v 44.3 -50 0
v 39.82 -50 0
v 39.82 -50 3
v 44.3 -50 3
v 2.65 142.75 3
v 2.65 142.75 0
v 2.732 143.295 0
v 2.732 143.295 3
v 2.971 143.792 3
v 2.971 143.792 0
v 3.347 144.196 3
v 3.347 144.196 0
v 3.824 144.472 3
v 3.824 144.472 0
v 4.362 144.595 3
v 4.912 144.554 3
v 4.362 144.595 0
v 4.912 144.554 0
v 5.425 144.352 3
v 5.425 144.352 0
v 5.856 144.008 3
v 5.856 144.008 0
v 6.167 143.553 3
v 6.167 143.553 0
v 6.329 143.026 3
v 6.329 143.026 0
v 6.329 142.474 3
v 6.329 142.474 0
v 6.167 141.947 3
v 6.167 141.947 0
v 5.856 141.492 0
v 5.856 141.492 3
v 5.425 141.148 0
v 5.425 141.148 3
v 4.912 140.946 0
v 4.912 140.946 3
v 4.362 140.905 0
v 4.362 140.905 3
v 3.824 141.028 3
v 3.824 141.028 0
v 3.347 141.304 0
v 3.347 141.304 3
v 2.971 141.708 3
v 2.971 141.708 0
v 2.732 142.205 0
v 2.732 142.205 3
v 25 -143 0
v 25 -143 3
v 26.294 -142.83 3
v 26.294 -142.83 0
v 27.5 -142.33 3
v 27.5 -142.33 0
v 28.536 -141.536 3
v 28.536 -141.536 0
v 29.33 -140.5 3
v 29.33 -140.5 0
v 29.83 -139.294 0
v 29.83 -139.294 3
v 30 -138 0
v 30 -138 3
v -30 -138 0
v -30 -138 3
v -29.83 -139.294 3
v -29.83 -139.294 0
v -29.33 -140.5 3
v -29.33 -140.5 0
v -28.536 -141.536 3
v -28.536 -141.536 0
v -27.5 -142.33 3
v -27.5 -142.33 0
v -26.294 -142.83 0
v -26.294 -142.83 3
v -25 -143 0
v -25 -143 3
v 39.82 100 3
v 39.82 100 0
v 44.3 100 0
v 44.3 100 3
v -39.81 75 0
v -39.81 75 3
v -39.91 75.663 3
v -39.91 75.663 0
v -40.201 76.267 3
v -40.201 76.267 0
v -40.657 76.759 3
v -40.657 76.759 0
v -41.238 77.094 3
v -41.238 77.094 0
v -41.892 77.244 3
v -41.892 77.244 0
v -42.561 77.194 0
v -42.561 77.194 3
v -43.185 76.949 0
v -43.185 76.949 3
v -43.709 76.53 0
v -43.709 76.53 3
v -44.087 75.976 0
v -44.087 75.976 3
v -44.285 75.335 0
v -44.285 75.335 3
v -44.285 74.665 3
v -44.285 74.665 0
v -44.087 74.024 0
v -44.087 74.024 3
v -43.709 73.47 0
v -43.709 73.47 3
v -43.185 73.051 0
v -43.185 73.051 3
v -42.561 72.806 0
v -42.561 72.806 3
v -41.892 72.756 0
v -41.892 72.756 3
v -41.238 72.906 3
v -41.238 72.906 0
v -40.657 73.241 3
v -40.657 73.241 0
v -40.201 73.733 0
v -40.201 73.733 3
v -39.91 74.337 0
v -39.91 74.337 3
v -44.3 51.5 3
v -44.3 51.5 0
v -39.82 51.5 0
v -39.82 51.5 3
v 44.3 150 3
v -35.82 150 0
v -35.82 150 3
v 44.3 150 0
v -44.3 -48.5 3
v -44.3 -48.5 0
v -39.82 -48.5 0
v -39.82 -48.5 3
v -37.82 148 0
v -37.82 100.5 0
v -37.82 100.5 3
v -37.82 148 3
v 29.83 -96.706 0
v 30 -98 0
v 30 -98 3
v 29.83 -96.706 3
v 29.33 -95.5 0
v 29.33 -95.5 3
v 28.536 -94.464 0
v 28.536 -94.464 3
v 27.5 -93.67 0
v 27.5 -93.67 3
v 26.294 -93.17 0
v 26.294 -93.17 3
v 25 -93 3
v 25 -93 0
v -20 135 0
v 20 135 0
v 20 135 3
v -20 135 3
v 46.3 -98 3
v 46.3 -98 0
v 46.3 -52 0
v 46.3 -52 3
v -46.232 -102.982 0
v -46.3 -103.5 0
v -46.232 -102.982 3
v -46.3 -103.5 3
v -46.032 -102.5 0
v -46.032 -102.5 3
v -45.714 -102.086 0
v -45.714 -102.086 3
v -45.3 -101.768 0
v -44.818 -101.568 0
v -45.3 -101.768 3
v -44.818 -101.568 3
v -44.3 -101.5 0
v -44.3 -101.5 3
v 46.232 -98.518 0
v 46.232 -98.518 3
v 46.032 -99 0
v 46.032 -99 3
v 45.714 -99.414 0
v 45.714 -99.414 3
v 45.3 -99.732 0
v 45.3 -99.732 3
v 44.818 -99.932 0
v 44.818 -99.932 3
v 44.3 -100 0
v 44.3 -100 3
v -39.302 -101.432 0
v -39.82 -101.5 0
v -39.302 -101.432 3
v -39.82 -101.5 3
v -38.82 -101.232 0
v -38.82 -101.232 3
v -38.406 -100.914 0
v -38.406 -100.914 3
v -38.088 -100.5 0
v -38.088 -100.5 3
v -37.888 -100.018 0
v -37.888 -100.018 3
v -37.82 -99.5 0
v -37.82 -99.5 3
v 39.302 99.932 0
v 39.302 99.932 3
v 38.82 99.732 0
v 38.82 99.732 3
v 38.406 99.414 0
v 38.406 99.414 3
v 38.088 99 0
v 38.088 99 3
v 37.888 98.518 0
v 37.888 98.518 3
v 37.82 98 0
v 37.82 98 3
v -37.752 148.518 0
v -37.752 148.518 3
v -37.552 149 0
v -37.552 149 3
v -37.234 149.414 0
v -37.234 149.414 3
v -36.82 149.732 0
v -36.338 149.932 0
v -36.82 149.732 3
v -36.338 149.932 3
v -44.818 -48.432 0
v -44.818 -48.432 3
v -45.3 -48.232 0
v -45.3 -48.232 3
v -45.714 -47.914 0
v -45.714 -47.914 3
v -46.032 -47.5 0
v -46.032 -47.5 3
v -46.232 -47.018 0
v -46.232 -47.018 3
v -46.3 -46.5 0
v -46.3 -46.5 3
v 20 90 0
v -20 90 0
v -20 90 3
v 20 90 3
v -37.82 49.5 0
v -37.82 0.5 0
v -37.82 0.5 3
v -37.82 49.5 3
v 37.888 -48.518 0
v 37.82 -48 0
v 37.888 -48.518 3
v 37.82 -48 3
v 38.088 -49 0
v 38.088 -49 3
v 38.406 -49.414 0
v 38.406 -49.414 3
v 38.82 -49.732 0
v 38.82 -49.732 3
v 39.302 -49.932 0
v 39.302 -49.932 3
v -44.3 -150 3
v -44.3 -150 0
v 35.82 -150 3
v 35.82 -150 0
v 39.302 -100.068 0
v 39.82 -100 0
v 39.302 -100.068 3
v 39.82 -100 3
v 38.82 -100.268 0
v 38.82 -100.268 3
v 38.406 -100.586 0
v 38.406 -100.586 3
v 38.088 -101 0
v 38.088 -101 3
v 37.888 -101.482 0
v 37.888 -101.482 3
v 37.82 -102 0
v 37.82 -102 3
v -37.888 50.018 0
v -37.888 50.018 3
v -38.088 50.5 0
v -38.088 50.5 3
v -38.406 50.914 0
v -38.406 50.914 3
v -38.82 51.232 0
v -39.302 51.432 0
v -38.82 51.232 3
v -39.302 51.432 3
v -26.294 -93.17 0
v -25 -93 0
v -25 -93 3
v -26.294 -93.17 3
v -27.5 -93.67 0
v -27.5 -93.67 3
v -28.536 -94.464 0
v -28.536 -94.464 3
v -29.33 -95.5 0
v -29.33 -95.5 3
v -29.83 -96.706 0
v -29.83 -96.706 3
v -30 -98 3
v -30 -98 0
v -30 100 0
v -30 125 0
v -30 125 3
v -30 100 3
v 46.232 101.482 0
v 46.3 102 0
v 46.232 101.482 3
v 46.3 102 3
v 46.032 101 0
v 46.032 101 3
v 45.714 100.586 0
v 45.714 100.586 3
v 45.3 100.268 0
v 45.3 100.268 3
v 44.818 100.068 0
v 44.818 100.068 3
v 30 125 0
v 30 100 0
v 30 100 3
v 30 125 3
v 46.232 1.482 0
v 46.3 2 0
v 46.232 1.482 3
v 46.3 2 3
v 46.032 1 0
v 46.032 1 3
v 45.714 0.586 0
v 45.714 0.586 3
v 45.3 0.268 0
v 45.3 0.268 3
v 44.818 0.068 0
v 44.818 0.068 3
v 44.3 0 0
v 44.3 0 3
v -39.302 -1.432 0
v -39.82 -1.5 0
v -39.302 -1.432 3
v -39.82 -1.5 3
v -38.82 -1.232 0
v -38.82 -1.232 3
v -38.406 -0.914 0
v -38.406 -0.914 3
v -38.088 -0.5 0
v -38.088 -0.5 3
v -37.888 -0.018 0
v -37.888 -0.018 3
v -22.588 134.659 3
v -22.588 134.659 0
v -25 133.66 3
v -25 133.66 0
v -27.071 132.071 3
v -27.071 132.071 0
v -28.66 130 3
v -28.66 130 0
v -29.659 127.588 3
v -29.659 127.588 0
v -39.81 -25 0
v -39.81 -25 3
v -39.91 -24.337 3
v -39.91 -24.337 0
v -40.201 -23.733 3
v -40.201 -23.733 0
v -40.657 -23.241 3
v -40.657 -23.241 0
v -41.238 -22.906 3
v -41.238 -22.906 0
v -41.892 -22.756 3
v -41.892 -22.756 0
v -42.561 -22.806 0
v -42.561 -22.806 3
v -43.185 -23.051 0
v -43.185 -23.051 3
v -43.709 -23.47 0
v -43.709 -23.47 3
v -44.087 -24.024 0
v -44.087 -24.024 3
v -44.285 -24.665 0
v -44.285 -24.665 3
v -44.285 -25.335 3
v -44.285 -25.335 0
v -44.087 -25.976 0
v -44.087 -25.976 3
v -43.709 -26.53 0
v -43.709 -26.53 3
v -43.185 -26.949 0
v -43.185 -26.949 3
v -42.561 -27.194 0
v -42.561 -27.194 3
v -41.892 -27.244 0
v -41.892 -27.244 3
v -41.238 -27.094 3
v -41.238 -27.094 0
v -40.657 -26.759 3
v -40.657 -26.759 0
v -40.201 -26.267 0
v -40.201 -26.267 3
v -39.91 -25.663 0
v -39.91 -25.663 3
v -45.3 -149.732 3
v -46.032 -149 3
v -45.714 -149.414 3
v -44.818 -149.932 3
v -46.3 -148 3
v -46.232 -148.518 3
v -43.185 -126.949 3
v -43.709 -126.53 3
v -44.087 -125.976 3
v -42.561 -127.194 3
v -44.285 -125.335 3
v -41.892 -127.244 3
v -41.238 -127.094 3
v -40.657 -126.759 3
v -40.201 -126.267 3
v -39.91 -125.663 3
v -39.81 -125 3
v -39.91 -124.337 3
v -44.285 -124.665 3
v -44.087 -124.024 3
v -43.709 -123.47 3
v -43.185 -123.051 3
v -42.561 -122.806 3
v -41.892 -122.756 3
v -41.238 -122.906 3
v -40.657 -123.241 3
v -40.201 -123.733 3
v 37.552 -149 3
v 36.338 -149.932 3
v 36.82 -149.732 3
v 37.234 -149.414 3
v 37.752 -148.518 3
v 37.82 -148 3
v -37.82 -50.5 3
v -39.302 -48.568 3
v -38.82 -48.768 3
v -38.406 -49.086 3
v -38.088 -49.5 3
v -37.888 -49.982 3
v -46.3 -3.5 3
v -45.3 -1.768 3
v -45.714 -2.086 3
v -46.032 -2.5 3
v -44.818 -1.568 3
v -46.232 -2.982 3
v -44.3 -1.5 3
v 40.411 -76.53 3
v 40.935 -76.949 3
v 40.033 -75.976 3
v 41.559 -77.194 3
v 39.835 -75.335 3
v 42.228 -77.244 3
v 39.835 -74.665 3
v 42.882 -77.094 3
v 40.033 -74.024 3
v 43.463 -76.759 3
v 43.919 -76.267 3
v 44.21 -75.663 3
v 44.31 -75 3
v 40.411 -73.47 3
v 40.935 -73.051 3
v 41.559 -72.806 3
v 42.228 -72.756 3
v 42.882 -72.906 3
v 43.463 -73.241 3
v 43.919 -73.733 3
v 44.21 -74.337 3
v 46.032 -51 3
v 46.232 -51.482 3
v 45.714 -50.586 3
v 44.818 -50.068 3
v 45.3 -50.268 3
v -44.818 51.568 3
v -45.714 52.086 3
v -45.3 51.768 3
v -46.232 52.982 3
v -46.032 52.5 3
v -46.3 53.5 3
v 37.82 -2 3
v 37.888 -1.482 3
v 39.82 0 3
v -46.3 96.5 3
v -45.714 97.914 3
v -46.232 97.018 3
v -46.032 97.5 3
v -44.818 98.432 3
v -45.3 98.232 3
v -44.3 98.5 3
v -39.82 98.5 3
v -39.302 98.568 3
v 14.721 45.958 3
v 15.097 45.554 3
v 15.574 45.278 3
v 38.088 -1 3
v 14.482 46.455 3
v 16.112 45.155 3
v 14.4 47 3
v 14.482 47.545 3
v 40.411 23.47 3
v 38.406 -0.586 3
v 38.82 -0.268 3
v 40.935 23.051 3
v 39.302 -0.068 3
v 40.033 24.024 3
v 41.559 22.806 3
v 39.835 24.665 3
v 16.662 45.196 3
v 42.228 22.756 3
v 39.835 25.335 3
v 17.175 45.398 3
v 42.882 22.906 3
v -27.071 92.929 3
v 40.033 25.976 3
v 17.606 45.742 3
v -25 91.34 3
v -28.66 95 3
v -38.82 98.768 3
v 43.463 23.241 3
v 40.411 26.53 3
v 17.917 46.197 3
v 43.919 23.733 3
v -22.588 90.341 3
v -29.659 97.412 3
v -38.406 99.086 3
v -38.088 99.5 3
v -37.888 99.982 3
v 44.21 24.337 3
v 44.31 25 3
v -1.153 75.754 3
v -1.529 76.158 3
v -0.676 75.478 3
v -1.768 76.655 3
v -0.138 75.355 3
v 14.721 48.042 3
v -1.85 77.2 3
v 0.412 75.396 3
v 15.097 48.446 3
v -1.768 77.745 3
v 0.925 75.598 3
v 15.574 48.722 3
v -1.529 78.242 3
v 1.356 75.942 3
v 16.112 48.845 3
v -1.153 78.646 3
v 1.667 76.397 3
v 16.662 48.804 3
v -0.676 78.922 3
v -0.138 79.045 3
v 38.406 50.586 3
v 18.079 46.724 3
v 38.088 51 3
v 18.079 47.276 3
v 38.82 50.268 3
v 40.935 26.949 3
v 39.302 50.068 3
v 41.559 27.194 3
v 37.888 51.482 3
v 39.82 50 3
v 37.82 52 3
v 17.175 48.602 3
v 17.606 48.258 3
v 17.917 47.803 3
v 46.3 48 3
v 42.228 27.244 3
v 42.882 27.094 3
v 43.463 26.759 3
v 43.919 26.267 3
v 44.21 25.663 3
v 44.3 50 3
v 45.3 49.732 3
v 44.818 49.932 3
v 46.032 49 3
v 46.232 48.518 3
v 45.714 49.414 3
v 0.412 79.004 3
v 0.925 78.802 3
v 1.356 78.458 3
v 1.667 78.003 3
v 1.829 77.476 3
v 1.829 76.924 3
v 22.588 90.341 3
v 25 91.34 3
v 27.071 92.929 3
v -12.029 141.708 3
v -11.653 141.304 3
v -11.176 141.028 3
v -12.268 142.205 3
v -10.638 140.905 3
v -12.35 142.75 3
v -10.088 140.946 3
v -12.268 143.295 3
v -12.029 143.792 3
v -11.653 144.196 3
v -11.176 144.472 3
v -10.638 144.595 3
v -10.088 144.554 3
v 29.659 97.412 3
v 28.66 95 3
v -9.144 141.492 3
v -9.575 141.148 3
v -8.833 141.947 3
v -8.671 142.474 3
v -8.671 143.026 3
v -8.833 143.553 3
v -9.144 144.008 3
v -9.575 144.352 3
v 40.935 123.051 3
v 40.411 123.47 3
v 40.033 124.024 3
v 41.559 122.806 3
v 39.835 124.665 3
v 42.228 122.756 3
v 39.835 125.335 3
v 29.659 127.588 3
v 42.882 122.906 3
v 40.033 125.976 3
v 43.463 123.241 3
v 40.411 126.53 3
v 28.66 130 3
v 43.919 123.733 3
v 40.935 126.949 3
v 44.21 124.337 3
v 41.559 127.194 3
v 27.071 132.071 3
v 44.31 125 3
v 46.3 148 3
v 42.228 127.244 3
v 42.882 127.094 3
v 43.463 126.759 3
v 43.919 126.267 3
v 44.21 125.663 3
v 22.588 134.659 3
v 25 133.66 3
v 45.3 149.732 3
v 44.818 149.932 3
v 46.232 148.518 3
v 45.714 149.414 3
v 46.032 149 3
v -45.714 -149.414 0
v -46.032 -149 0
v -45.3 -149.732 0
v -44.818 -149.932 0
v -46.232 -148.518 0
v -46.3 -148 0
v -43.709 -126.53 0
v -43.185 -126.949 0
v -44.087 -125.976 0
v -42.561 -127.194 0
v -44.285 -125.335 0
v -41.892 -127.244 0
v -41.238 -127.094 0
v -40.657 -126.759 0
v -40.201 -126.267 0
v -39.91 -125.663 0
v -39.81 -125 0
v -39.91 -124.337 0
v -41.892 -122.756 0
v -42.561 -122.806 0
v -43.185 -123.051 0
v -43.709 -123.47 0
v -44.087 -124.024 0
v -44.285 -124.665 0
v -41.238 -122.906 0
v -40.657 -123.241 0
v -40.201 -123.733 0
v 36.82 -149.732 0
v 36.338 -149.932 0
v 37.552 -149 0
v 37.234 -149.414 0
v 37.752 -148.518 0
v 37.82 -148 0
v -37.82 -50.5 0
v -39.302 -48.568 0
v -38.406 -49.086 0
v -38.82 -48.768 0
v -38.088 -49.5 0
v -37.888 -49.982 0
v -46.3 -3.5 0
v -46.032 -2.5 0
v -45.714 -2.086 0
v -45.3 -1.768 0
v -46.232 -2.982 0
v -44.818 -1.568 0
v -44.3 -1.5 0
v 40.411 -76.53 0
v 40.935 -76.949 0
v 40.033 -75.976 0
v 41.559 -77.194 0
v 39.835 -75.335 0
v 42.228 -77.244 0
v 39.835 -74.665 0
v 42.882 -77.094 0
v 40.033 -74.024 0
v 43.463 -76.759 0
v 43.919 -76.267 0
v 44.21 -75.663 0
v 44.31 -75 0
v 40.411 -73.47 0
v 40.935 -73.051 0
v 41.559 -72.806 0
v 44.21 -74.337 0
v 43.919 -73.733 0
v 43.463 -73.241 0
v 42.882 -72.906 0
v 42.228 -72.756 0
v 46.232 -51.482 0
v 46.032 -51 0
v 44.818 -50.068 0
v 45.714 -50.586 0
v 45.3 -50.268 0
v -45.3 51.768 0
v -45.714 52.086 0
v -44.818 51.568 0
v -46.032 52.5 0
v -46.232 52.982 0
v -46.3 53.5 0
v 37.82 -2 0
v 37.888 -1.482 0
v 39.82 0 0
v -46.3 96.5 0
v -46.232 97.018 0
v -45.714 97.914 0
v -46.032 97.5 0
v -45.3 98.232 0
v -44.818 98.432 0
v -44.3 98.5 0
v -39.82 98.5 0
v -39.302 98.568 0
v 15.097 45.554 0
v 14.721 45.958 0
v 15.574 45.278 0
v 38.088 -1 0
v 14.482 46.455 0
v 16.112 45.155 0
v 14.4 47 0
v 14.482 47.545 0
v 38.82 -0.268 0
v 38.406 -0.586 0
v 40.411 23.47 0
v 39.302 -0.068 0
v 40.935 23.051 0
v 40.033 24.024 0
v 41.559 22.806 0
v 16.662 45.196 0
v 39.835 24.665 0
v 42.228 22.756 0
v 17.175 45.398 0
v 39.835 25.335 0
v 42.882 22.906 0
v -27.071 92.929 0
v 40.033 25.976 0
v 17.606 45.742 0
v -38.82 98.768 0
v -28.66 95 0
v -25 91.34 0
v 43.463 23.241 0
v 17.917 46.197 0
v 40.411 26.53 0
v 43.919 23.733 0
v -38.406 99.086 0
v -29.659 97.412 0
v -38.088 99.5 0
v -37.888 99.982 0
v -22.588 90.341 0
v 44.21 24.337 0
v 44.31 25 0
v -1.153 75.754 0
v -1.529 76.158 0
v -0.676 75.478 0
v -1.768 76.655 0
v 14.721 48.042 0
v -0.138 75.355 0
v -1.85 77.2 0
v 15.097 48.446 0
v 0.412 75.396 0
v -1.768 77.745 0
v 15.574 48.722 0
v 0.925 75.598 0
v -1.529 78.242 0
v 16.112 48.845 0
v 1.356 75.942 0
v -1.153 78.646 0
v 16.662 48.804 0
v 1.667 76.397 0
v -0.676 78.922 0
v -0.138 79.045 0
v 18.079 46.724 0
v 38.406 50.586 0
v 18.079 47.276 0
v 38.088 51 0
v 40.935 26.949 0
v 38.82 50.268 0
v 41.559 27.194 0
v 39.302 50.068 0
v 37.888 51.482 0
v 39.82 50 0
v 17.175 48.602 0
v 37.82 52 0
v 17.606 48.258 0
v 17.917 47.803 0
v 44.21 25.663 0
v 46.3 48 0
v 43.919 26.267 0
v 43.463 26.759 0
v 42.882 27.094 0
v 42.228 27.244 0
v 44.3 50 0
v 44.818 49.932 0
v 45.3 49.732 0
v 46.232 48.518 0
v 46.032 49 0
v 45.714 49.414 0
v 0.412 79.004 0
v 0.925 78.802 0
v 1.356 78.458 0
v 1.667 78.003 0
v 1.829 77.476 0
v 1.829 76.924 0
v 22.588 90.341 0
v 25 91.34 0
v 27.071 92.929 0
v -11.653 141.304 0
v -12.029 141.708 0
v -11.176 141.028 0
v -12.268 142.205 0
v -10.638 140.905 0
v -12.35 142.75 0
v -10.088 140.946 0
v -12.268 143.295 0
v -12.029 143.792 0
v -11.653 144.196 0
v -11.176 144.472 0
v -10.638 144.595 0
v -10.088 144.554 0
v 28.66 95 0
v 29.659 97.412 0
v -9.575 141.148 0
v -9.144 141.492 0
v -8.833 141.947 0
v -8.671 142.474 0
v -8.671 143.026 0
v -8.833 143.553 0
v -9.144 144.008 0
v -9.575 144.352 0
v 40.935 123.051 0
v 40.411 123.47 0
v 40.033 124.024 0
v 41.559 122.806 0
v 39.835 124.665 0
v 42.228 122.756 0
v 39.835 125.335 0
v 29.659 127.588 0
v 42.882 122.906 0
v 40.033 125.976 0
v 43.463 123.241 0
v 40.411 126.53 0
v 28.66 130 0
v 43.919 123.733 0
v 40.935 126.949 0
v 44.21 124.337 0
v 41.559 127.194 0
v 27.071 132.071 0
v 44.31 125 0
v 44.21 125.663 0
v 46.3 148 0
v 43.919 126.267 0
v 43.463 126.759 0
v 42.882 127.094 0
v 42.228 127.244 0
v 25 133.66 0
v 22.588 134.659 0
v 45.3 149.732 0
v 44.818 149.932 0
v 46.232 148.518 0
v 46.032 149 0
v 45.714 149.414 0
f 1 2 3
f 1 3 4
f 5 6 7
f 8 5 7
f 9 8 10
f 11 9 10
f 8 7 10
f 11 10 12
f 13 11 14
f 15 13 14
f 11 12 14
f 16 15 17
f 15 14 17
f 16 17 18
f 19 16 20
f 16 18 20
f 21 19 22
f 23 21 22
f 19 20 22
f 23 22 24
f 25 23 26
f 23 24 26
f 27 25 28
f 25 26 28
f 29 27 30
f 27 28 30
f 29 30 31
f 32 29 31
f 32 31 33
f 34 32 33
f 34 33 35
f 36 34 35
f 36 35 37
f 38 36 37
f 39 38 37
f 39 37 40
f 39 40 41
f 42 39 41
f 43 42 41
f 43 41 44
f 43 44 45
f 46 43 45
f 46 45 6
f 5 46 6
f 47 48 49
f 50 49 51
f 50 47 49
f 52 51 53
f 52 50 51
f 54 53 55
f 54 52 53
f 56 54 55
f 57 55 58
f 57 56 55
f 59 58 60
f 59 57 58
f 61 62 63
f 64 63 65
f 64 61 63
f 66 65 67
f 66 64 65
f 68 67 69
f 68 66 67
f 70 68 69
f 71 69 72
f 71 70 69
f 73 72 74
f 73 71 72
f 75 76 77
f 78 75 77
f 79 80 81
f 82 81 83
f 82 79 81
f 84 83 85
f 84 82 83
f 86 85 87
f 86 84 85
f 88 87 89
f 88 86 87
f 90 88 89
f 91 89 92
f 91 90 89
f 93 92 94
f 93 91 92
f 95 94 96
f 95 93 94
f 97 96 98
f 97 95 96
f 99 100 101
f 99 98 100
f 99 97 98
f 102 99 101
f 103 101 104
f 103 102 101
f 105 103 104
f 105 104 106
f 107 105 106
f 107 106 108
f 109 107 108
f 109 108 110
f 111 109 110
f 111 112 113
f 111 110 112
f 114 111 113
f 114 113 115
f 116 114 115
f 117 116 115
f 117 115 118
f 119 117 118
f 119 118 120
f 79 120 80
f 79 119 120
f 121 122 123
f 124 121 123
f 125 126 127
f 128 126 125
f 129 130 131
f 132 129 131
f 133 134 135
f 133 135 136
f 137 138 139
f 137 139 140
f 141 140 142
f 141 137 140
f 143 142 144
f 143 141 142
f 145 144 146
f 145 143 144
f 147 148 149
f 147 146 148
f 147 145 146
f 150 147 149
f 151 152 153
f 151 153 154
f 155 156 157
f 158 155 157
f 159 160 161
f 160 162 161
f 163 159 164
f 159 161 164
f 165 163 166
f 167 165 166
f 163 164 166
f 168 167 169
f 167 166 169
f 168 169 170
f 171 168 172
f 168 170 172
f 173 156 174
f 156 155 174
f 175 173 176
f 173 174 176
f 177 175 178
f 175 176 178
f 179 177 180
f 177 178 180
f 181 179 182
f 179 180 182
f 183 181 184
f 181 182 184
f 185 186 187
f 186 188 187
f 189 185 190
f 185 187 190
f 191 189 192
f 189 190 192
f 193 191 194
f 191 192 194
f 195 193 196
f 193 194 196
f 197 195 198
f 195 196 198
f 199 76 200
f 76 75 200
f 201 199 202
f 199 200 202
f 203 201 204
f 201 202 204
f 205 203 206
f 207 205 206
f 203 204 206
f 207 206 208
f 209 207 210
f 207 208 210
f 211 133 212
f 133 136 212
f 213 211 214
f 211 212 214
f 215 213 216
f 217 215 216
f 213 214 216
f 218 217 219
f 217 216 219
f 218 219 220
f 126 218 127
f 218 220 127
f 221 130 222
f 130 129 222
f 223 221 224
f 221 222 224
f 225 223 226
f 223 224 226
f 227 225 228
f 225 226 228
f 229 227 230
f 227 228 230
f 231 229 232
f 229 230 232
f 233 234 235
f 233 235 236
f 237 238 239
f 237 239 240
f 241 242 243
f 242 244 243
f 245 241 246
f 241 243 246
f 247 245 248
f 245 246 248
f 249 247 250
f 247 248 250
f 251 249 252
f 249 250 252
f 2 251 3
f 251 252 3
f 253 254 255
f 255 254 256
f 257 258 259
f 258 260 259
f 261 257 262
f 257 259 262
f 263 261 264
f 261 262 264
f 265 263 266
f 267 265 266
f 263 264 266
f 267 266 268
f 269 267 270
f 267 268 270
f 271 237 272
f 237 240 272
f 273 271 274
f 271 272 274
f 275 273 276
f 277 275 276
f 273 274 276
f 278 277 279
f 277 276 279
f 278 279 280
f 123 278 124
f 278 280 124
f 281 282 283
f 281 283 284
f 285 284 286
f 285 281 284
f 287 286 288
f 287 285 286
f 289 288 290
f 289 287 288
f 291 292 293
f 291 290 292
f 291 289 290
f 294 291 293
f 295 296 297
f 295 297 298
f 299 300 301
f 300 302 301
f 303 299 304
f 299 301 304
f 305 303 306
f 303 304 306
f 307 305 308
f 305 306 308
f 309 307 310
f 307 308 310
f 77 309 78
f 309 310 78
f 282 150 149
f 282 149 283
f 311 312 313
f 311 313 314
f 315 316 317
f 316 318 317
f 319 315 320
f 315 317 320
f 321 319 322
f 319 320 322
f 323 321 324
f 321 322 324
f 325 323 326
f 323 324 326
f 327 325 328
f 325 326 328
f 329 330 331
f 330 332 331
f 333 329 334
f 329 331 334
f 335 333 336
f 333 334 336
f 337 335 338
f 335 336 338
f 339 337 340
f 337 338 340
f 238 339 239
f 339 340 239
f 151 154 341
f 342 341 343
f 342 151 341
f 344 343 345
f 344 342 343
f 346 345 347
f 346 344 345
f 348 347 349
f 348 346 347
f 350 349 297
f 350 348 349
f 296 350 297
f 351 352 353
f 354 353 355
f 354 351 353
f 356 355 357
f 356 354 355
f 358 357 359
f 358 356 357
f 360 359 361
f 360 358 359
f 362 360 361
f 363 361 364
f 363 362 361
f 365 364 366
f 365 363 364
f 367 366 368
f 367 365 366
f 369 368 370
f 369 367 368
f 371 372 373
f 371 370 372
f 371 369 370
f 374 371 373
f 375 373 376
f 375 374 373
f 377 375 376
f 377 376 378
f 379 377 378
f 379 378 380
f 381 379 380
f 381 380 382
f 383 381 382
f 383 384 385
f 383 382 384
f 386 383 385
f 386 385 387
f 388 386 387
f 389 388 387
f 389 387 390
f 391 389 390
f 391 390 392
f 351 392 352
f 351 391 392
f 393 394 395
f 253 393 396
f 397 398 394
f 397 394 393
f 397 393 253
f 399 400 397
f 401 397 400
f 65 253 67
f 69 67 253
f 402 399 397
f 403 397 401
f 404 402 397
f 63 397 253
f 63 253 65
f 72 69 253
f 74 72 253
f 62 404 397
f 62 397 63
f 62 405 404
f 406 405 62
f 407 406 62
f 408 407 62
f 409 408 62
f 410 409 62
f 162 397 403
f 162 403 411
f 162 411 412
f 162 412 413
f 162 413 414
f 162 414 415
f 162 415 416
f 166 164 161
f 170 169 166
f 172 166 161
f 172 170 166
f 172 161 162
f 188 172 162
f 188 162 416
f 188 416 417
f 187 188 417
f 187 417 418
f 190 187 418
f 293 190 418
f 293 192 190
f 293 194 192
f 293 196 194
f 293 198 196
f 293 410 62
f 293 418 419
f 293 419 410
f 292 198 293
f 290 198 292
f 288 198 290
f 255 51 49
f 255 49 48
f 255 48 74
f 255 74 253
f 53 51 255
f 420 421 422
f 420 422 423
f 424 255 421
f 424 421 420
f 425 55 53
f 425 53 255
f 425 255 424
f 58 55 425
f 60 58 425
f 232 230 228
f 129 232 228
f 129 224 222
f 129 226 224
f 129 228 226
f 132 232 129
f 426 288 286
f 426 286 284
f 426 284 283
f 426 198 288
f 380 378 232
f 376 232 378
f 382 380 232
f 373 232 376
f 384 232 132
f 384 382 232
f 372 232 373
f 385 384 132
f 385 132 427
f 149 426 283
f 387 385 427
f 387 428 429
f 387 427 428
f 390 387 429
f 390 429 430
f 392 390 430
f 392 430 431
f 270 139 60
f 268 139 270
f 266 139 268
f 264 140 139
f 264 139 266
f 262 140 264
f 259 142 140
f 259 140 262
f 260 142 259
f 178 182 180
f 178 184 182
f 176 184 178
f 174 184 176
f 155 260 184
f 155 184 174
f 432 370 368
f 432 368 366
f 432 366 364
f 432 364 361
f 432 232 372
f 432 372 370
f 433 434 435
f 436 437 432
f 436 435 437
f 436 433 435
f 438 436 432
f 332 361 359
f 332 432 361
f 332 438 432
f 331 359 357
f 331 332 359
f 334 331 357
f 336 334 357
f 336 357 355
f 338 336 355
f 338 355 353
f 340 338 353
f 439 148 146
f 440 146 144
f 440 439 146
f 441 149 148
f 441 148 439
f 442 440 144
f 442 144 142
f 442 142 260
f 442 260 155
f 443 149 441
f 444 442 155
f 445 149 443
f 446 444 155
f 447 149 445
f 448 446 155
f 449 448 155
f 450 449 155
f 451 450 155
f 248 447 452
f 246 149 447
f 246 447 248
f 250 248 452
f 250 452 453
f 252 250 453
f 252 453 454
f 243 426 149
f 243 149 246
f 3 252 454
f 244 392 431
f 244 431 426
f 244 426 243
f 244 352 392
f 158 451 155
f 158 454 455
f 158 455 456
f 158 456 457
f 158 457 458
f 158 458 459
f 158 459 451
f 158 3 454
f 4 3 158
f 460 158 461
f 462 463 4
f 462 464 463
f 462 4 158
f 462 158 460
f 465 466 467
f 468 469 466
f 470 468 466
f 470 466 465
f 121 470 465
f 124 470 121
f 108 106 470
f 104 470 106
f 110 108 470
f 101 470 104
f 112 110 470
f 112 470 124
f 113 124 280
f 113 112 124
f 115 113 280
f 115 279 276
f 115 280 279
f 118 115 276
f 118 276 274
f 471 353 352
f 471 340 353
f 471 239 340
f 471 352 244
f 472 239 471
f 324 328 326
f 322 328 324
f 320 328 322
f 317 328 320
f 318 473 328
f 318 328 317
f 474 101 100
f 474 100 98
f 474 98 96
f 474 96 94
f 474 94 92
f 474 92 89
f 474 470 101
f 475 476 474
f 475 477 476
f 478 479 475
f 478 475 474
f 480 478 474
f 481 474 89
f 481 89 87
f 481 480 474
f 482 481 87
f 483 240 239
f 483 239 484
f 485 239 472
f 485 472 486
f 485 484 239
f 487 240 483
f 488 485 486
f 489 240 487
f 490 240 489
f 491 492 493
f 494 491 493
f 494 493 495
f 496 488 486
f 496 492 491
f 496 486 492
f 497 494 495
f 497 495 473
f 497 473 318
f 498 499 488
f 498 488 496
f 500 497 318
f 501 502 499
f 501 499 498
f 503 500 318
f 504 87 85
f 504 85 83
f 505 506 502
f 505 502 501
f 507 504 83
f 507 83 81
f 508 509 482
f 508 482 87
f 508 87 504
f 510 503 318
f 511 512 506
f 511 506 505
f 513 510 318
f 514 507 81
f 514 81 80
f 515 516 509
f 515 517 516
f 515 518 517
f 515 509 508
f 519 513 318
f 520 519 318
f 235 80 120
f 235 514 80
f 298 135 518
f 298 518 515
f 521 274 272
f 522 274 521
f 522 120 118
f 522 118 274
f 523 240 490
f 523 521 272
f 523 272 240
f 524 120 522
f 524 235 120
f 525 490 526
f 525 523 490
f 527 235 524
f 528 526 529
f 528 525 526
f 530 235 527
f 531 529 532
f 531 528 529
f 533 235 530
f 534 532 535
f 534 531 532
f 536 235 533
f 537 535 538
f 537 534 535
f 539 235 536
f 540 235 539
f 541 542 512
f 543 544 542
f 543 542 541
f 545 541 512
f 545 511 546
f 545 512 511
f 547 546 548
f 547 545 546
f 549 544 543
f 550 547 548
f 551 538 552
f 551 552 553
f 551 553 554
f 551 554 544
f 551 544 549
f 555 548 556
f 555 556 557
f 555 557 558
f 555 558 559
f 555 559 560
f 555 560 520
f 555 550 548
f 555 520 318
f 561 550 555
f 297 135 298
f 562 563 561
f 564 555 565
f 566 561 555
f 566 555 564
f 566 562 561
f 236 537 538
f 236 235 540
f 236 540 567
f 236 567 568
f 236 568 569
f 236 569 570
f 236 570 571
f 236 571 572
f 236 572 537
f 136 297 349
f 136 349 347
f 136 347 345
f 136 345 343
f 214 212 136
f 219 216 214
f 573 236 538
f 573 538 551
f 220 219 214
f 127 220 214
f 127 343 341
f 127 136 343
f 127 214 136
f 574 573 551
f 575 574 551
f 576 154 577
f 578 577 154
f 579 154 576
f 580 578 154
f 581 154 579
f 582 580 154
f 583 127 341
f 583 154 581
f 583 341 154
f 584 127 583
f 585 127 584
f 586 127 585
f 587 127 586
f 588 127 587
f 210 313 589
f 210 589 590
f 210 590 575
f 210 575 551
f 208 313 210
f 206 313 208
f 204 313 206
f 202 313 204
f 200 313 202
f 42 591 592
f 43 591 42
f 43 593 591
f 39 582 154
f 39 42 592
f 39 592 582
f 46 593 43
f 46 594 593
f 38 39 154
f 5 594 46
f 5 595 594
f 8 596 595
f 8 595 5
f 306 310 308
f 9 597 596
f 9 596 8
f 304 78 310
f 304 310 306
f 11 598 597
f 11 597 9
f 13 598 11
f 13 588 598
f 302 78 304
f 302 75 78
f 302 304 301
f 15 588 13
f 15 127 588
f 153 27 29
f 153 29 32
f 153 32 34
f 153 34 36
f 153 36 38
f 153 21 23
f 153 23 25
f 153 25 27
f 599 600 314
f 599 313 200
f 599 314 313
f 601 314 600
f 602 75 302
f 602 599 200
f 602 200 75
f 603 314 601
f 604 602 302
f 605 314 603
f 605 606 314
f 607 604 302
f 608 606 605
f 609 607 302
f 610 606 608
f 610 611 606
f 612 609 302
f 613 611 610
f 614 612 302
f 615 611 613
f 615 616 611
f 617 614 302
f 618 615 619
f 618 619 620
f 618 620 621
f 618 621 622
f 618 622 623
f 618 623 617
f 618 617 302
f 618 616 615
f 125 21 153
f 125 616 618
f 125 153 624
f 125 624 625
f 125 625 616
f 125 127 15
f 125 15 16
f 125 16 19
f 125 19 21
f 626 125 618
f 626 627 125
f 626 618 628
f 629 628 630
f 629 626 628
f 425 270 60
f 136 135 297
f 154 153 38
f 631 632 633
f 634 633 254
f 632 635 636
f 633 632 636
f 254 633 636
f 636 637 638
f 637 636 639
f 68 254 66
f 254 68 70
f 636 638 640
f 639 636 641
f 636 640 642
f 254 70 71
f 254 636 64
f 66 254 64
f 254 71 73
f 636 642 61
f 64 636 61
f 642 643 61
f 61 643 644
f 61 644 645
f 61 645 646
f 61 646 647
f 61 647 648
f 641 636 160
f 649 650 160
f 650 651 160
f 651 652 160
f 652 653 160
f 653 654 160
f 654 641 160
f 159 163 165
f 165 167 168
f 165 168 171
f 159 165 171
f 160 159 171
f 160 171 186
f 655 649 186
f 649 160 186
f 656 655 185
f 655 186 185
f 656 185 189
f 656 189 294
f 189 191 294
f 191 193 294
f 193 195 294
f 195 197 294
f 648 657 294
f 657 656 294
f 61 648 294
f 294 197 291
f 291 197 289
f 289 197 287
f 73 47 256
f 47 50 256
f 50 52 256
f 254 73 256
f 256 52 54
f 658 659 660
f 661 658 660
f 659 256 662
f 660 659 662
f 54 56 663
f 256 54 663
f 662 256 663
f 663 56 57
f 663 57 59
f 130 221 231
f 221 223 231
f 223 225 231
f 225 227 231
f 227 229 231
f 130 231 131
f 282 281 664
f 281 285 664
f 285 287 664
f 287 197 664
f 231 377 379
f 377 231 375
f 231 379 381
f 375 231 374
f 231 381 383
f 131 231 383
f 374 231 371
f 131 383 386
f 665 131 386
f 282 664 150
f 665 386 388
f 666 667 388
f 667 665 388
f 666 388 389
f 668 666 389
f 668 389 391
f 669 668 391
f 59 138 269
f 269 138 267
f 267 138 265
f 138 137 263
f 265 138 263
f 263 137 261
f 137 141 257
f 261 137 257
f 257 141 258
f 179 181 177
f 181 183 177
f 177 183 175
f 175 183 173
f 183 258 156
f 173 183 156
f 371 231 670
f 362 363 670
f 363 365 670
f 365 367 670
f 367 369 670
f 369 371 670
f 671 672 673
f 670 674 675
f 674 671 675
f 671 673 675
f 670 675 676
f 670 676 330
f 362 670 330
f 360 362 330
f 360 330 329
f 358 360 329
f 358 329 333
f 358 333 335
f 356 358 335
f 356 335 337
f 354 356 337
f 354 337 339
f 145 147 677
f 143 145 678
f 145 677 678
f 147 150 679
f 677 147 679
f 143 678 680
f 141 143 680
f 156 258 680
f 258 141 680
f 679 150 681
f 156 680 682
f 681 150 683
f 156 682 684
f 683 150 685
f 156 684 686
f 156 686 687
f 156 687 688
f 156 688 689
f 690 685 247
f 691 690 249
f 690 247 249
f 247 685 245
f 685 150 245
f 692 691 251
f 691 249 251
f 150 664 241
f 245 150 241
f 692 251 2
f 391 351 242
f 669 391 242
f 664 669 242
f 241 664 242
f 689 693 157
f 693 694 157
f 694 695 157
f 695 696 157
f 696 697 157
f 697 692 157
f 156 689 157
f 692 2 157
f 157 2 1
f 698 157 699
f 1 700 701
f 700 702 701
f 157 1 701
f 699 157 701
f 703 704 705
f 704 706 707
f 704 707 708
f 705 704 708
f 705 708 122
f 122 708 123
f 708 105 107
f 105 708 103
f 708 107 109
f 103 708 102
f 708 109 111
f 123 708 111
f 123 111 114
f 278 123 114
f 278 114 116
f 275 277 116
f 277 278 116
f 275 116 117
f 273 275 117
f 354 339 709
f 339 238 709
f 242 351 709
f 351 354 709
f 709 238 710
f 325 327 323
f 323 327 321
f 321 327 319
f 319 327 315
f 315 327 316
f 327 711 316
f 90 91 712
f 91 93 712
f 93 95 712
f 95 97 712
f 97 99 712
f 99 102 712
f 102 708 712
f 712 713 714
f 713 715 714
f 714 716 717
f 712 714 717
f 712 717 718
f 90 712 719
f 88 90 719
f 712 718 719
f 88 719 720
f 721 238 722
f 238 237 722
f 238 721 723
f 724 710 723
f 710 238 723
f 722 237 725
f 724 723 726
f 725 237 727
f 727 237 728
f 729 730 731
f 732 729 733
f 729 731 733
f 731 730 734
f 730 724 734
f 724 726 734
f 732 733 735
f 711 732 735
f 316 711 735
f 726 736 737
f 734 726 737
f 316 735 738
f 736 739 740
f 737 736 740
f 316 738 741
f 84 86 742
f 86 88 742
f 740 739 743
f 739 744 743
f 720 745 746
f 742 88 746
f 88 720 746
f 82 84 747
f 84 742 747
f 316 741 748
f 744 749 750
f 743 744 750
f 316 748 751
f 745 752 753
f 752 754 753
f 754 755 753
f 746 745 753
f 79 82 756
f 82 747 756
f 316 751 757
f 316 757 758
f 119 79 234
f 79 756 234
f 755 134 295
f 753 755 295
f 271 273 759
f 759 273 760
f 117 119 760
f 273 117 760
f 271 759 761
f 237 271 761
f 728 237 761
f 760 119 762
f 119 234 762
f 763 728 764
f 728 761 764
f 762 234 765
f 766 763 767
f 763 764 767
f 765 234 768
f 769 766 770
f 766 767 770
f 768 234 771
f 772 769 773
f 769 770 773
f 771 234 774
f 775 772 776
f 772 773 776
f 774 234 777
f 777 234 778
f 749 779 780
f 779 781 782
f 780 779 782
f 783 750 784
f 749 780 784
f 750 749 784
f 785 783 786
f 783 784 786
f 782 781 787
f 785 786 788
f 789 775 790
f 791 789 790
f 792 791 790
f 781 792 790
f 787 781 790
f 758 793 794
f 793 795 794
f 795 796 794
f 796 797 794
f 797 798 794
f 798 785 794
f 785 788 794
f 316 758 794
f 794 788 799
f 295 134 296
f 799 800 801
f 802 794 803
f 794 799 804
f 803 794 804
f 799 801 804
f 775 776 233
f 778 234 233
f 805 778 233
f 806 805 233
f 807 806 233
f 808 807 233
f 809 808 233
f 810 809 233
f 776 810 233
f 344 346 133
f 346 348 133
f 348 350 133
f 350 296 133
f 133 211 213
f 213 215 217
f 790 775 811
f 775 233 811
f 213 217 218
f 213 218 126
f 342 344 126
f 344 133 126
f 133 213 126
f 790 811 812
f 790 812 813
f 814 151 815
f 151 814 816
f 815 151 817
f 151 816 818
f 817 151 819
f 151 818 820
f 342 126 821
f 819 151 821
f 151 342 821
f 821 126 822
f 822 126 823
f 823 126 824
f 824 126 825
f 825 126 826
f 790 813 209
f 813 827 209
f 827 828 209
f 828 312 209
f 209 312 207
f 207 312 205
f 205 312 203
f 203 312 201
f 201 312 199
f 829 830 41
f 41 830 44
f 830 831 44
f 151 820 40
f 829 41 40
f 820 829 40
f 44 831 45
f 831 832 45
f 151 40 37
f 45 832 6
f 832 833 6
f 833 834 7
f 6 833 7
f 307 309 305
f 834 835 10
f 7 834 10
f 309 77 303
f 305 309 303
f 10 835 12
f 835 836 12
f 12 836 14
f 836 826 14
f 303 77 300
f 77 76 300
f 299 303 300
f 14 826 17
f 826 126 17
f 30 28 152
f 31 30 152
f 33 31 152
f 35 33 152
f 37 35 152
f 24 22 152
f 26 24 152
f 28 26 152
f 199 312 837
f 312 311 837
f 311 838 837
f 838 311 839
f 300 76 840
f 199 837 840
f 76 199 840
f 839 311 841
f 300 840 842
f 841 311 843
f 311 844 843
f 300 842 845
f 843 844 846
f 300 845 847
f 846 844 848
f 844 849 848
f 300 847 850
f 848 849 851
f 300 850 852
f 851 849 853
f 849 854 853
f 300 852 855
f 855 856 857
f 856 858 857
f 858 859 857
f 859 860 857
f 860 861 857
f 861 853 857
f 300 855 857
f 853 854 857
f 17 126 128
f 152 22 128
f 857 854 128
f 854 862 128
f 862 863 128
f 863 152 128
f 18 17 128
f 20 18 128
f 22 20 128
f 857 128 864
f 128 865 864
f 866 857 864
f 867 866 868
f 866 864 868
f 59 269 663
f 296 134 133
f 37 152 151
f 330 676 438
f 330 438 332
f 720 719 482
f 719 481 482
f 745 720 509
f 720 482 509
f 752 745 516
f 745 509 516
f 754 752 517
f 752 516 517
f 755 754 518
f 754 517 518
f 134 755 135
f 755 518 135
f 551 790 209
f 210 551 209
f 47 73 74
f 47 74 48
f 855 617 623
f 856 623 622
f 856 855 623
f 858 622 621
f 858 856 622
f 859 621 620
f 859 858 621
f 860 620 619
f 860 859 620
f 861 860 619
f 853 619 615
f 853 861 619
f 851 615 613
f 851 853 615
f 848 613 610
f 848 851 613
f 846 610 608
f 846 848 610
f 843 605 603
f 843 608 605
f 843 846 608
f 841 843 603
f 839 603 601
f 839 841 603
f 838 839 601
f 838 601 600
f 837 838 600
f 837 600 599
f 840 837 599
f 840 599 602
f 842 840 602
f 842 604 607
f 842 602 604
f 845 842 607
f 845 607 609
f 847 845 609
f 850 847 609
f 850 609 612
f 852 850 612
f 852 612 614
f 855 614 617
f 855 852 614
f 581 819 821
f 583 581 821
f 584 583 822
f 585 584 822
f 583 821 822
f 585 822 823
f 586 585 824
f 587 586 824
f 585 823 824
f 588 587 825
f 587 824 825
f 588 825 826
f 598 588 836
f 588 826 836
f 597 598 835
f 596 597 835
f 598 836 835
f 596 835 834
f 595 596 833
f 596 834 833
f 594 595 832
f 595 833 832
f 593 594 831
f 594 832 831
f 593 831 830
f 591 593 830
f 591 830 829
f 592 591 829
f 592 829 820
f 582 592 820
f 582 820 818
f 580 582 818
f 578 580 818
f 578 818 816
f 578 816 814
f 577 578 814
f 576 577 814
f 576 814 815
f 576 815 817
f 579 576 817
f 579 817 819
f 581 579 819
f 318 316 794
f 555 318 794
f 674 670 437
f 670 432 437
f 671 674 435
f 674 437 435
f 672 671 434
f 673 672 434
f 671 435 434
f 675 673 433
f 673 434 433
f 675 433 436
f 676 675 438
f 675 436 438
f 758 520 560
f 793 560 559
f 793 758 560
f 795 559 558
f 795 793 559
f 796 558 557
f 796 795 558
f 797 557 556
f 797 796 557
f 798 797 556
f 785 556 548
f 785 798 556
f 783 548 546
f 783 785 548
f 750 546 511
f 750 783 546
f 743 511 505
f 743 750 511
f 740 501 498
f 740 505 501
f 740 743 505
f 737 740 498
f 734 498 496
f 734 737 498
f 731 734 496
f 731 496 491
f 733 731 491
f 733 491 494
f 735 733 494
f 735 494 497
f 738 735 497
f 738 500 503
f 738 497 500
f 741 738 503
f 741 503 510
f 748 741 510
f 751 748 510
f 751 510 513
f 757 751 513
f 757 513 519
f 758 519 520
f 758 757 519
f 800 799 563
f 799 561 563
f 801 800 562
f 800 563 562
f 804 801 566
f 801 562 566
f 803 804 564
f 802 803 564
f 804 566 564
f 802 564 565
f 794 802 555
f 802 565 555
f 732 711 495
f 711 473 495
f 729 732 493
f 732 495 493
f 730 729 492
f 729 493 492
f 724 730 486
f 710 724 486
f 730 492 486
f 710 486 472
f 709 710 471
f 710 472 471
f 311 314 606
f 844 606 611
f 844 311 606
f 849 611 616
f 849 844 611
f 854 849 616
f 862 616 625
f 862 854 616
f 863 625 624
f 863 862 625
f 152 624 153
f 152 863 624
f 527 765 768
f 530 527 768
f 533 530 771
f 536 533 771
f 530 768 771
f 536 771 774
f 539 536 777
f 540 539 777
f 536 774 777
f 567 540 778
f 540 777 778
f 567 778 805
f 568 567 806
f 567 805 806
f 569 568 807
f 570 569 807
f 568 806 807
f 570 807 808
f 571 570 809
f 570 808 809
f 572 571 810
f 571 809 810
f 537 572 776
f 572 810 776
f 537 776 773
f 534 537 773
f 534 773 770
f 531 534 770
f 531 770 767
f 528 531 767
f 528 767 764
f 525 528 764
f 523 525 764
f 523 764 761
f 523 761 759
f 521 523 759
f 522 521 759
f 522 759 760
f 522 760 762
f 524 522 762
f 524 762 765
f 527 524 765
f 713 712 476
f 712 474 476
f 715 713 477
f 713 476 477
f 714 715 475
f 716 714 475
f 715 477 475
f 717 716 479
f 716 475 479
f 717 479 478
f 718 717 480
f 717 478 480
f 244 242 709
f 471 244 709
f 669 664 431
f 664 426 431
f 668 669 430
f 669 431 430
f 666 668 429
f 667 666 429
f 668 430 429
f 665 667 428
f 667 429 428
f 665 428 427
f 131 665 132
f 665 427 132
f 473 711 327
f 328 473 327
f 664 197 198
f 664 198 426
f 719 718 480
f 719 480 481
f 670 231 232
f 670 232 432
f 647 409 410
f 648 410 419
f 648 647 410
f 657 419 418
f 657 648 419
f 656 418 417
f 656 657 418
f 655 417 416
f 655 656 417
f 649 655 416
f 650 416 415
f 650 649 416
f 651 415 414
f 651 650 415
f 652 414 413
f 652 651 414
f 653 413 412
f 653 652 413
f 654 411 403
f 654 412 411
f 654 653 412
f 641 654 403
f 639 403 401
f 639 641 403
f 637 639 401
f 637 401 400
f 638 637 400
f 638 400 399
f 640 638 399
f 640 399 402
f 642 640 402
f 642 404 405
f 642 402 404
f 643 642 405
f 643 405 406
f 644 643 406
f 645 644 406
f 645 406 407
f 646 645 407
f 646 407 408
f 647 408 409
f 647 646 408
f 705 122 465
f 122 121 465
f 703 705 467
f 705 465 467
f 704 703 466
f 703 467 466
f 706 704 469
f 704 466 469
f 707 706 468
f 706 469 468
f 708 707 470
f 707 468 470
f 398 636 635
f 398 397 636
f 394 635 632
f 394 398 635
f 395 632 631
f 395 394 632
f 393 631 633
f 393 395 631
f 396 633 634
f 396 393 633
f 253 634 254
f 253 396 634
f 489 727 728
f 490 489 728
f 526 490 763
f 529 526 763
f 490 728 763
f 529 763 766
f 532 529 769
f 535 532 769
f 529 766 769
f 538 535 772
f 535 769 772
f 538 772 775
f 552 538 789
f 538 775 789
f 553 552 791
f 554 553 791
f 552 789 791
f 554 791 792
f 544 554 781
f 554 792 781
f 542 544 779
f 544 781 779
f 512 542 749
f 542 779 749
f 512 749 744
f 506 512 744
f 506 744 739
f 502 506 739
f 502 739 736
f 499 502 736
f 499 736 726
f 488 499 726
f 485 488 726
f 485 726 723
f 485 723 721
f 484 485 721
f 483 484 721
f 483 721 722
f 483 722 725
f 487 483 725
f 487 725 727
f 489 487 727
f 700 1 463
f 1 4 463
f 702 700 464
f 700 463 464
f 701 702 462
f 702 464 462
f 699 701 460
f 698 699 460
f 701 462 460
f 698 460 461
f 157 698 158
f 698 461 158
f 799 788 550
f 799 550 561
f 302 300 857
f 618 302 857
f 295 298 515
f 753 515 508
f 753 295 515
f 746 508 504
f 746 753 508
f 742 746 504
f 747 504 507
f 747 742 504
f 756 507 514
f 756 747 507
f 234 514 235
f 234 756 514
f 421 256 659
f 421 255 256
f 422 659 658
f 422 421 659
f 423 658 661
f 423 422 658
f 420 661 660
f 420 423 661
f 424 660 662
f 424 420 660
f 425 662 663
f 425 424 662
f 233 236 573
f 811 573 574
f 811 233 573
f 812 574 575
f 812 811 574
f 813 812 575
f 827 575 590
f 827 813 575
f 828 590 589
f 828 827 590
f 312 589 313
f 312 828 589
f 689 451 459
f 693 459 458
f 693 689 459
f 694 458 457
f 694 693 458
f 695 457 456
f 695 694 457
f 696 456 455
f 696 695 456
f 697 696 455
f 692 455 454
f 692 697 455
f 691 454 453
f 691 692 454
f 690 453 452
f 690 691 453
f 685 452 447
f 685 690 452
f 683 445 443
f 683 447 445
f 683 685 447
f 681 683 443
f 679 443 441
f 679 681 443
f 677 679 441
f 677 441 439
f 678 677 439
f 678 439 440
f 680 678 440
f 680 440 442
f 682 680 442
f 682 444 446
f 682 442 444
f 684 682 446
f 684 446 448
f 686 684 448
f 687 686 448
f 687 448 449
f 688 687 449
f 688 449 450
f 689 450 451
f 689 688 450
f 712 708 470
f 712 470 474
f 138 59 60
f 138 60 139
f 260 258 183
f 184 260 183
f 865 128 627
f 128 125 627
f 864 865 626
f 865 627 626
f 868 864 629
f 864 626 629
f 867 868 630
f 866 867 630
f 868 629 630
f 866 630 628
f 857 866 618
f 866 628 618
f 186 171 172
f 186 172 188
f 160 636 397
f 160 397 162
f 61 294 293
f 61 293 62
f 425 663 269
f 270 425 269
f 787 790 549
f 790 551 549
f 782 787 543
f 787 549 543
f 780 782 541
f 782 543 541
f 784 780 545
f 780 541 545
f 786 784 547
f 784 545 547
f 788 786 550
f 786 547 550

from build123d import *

# Parameters (mm, degrees)
SKETCH1_W           = 92.6
SKETCH1_H           = 300
BOSS_EXTRUDE1_DEPTH = 3
SKETCH2_R           = 2.25
SKETCH2_W           = 8.48
SKETCH2_H           = 51.5
SKETCH2_H_2         = 50
SKETCH2_H_3         = 53
CUT_EXTRUDE1_DEPTH  = 10
FILLET1_R           = 2
CUT_EXTRUDE3_DEPTH  = 8.5
SKETCH5_R           = 1.85
CUT_EXTRUDE4_DEPTH  = 10
SKETCH6_R           = 1.85
CUT_EXTRUDE5_DEPTH  = 10


with BuildPart() as part:
    # Sketch1 → Boss-Extrude1 (new body)
    with BuildSketch(Plane.XY):
        Rectangle(SKETCH1_W, SKETCH1_H)
    extrude(amount=BOSS_EXTRUDE1_DEPTH)

    # Sketch2 → Cut-Extrude1 (cut)
    with BuildSketch(Plane.XY):
        with Locations((-42.06, 75)):
            Circle(SKETCH2_R)
        with Locations((42.06, 125)):
            Circle(SKETCH2_R)
        with Locations((42.06, 25)):
            Circle(SKETCH2_R)
        with Locations((42.06, -75)):
            Circle(SKETCH2_R)
        with Locations((-42.06, -25)):
            Circle(SKETCH2_R)
        with Locations((-42.06, -125)):
            Circle(SKETCH2_R)
        with Locations((-42.06, 124.25)):
            Rectangle(SKETCH2_W, SKETCH2_H)
        with Locations((42.06, 75)):
            Rectangle(SKETCH2_W, SKETCH2_H_2)
        with Locations((42.06, -25)):
            Rectangle(SKETCH2_W, SKETCH2_H_2)
        with Locations((-42.06, 25)):
            Rectangle(SKETCH2_W, SKETCH2_H_3)
        with Locations((-42.06, -75)):
            Rectangle(SKETCH2_W, SKETCH2_H_3)
        with Locations((42.06, -125)):
            Rectangle(SKETCH2_W, SKETCH2_H_2)
    extrude(amount=CUT_EXTRUDE1_DEPTH, mode=Mode.SUBTRACT)

    # Fillet1
    fillet1_edges = [part.edges().sort_by_distance(p)[0] for p in [
        (46.3, -100, 1.5),
        (37.82, -100, 1.5),
        (37.82, -150, 1.5),
        (46.3, 50, 1.5),
        (46.3, 100, 1.5),
        (37.82, 100, 1.5),
        (37.82, 50, 1.5),
        (-46.3, -48.5, 1.5),
        (-46.3, -101.5, 1.5),
        (-37.82, -101.5, 1.5),
        (-37.82, -48.5, 1.5),
        (37.82, 0, 1.5),
        (37.82, -50, 1.5),
        (46.3, -50, 1.5),
        (46.3, 0, 1.5),
        (46.3, 150, 1.5),
        (-46.3, 51.5, 1.5),
        (-46.3, -150, 1.5),
        (-46.3, -1.5, 1.5),
        (-37.82, -1.5, 1.5),
        (-37.82, 51.5, 1.5),
        (-46.3, 98.5, 1.5),
        (-37.82, 98.5, 1.5),
        (-37.82, 150, 1.5),
    ]]
    fillet(fillet1_edges, radius=FILLET1_R)

    # Sketch4 → Cut-Extrude3 (cut)
    with BuildSketch(Plane(origin=(0, 0, 0), x_dir=(-1, 0, 0), z_dir=(0, 0, -1))):
        with BuildLine():
            Line((20, 90), (-20, 90))
            ThreePointArc((-20, 90), (-27.071067812, 92.928932188), (-30, 100))
            Line((-30, 100), (-30, 125))
            ThreePointArc((-30, 125), (-27.071067812, 132.071067812), (-20, 135))
            Line((-20, 135), (20, 135))
            ThreePointArc((20, 135), (27.071067812, 132.071067812), (30, 125))
            Line((30, 125), (30, 100))
            ThreePointArc((30, 100), (27.071067812, 92.928932188), (20, 90))
        make_face()
        with BuildLine():
            Line((25, -143), (-25, -143))
            ThreePointArc((-25, -143), (-28.535533906, -141.535533906), (-30, -138))
            Line((-30, -138), (-30, -98))
            ThreePointArc((-30, -98), (-28.535533906, -94.464466094), (-25, -93))
            Line((-25, -93), (25, -93))
            ThreePointArc((25, -93), (28.535533906, -94.464466094), (30, -98))
            Line((30, -98), (30, -138))
            ThreePointArc((30, -138), (28.535533906, -141.535533906), (25, -143))
        make_face()
    extrude(amount=-CUT_EXTRUDE3_DEPTH, mode=Mode.SUBTRACT)

    # Sketch5 → Cut-Extrude4 (cut)
    with BuildSketch(Plane(origin=(0, 0, 0), x_dir=(-1, 0, 0), z_dir=(0, 0, -1))):
        with Locations((0, 77.2)):
            Circle(SKETCH5_R)
        with Locations((-16.25, 47)):
            Circle(SKETCH5_R)
    extrude(amount=-CUT_EXTRUDE4_DEPTH, mode=Mode.SUBTRACT)

    # Sketch6 → Cut-Extrude5 (cut)
    with BuildSketch(Plane(origin=(0, 0, 0), x_dir=(-1, 0, 0), z_dir=(0, 0, -1))):
        with Locations((-4.5, 142.75)):
            Circle(SKETCH6_R)
        with Locations((10.5, 142.75)):
            Circle(SKETCH6_R)
    extrude(amount=-CUT_EXTRUDE5_DEPTH, mode=Mode.SUBTRACT)


solid = part.part
